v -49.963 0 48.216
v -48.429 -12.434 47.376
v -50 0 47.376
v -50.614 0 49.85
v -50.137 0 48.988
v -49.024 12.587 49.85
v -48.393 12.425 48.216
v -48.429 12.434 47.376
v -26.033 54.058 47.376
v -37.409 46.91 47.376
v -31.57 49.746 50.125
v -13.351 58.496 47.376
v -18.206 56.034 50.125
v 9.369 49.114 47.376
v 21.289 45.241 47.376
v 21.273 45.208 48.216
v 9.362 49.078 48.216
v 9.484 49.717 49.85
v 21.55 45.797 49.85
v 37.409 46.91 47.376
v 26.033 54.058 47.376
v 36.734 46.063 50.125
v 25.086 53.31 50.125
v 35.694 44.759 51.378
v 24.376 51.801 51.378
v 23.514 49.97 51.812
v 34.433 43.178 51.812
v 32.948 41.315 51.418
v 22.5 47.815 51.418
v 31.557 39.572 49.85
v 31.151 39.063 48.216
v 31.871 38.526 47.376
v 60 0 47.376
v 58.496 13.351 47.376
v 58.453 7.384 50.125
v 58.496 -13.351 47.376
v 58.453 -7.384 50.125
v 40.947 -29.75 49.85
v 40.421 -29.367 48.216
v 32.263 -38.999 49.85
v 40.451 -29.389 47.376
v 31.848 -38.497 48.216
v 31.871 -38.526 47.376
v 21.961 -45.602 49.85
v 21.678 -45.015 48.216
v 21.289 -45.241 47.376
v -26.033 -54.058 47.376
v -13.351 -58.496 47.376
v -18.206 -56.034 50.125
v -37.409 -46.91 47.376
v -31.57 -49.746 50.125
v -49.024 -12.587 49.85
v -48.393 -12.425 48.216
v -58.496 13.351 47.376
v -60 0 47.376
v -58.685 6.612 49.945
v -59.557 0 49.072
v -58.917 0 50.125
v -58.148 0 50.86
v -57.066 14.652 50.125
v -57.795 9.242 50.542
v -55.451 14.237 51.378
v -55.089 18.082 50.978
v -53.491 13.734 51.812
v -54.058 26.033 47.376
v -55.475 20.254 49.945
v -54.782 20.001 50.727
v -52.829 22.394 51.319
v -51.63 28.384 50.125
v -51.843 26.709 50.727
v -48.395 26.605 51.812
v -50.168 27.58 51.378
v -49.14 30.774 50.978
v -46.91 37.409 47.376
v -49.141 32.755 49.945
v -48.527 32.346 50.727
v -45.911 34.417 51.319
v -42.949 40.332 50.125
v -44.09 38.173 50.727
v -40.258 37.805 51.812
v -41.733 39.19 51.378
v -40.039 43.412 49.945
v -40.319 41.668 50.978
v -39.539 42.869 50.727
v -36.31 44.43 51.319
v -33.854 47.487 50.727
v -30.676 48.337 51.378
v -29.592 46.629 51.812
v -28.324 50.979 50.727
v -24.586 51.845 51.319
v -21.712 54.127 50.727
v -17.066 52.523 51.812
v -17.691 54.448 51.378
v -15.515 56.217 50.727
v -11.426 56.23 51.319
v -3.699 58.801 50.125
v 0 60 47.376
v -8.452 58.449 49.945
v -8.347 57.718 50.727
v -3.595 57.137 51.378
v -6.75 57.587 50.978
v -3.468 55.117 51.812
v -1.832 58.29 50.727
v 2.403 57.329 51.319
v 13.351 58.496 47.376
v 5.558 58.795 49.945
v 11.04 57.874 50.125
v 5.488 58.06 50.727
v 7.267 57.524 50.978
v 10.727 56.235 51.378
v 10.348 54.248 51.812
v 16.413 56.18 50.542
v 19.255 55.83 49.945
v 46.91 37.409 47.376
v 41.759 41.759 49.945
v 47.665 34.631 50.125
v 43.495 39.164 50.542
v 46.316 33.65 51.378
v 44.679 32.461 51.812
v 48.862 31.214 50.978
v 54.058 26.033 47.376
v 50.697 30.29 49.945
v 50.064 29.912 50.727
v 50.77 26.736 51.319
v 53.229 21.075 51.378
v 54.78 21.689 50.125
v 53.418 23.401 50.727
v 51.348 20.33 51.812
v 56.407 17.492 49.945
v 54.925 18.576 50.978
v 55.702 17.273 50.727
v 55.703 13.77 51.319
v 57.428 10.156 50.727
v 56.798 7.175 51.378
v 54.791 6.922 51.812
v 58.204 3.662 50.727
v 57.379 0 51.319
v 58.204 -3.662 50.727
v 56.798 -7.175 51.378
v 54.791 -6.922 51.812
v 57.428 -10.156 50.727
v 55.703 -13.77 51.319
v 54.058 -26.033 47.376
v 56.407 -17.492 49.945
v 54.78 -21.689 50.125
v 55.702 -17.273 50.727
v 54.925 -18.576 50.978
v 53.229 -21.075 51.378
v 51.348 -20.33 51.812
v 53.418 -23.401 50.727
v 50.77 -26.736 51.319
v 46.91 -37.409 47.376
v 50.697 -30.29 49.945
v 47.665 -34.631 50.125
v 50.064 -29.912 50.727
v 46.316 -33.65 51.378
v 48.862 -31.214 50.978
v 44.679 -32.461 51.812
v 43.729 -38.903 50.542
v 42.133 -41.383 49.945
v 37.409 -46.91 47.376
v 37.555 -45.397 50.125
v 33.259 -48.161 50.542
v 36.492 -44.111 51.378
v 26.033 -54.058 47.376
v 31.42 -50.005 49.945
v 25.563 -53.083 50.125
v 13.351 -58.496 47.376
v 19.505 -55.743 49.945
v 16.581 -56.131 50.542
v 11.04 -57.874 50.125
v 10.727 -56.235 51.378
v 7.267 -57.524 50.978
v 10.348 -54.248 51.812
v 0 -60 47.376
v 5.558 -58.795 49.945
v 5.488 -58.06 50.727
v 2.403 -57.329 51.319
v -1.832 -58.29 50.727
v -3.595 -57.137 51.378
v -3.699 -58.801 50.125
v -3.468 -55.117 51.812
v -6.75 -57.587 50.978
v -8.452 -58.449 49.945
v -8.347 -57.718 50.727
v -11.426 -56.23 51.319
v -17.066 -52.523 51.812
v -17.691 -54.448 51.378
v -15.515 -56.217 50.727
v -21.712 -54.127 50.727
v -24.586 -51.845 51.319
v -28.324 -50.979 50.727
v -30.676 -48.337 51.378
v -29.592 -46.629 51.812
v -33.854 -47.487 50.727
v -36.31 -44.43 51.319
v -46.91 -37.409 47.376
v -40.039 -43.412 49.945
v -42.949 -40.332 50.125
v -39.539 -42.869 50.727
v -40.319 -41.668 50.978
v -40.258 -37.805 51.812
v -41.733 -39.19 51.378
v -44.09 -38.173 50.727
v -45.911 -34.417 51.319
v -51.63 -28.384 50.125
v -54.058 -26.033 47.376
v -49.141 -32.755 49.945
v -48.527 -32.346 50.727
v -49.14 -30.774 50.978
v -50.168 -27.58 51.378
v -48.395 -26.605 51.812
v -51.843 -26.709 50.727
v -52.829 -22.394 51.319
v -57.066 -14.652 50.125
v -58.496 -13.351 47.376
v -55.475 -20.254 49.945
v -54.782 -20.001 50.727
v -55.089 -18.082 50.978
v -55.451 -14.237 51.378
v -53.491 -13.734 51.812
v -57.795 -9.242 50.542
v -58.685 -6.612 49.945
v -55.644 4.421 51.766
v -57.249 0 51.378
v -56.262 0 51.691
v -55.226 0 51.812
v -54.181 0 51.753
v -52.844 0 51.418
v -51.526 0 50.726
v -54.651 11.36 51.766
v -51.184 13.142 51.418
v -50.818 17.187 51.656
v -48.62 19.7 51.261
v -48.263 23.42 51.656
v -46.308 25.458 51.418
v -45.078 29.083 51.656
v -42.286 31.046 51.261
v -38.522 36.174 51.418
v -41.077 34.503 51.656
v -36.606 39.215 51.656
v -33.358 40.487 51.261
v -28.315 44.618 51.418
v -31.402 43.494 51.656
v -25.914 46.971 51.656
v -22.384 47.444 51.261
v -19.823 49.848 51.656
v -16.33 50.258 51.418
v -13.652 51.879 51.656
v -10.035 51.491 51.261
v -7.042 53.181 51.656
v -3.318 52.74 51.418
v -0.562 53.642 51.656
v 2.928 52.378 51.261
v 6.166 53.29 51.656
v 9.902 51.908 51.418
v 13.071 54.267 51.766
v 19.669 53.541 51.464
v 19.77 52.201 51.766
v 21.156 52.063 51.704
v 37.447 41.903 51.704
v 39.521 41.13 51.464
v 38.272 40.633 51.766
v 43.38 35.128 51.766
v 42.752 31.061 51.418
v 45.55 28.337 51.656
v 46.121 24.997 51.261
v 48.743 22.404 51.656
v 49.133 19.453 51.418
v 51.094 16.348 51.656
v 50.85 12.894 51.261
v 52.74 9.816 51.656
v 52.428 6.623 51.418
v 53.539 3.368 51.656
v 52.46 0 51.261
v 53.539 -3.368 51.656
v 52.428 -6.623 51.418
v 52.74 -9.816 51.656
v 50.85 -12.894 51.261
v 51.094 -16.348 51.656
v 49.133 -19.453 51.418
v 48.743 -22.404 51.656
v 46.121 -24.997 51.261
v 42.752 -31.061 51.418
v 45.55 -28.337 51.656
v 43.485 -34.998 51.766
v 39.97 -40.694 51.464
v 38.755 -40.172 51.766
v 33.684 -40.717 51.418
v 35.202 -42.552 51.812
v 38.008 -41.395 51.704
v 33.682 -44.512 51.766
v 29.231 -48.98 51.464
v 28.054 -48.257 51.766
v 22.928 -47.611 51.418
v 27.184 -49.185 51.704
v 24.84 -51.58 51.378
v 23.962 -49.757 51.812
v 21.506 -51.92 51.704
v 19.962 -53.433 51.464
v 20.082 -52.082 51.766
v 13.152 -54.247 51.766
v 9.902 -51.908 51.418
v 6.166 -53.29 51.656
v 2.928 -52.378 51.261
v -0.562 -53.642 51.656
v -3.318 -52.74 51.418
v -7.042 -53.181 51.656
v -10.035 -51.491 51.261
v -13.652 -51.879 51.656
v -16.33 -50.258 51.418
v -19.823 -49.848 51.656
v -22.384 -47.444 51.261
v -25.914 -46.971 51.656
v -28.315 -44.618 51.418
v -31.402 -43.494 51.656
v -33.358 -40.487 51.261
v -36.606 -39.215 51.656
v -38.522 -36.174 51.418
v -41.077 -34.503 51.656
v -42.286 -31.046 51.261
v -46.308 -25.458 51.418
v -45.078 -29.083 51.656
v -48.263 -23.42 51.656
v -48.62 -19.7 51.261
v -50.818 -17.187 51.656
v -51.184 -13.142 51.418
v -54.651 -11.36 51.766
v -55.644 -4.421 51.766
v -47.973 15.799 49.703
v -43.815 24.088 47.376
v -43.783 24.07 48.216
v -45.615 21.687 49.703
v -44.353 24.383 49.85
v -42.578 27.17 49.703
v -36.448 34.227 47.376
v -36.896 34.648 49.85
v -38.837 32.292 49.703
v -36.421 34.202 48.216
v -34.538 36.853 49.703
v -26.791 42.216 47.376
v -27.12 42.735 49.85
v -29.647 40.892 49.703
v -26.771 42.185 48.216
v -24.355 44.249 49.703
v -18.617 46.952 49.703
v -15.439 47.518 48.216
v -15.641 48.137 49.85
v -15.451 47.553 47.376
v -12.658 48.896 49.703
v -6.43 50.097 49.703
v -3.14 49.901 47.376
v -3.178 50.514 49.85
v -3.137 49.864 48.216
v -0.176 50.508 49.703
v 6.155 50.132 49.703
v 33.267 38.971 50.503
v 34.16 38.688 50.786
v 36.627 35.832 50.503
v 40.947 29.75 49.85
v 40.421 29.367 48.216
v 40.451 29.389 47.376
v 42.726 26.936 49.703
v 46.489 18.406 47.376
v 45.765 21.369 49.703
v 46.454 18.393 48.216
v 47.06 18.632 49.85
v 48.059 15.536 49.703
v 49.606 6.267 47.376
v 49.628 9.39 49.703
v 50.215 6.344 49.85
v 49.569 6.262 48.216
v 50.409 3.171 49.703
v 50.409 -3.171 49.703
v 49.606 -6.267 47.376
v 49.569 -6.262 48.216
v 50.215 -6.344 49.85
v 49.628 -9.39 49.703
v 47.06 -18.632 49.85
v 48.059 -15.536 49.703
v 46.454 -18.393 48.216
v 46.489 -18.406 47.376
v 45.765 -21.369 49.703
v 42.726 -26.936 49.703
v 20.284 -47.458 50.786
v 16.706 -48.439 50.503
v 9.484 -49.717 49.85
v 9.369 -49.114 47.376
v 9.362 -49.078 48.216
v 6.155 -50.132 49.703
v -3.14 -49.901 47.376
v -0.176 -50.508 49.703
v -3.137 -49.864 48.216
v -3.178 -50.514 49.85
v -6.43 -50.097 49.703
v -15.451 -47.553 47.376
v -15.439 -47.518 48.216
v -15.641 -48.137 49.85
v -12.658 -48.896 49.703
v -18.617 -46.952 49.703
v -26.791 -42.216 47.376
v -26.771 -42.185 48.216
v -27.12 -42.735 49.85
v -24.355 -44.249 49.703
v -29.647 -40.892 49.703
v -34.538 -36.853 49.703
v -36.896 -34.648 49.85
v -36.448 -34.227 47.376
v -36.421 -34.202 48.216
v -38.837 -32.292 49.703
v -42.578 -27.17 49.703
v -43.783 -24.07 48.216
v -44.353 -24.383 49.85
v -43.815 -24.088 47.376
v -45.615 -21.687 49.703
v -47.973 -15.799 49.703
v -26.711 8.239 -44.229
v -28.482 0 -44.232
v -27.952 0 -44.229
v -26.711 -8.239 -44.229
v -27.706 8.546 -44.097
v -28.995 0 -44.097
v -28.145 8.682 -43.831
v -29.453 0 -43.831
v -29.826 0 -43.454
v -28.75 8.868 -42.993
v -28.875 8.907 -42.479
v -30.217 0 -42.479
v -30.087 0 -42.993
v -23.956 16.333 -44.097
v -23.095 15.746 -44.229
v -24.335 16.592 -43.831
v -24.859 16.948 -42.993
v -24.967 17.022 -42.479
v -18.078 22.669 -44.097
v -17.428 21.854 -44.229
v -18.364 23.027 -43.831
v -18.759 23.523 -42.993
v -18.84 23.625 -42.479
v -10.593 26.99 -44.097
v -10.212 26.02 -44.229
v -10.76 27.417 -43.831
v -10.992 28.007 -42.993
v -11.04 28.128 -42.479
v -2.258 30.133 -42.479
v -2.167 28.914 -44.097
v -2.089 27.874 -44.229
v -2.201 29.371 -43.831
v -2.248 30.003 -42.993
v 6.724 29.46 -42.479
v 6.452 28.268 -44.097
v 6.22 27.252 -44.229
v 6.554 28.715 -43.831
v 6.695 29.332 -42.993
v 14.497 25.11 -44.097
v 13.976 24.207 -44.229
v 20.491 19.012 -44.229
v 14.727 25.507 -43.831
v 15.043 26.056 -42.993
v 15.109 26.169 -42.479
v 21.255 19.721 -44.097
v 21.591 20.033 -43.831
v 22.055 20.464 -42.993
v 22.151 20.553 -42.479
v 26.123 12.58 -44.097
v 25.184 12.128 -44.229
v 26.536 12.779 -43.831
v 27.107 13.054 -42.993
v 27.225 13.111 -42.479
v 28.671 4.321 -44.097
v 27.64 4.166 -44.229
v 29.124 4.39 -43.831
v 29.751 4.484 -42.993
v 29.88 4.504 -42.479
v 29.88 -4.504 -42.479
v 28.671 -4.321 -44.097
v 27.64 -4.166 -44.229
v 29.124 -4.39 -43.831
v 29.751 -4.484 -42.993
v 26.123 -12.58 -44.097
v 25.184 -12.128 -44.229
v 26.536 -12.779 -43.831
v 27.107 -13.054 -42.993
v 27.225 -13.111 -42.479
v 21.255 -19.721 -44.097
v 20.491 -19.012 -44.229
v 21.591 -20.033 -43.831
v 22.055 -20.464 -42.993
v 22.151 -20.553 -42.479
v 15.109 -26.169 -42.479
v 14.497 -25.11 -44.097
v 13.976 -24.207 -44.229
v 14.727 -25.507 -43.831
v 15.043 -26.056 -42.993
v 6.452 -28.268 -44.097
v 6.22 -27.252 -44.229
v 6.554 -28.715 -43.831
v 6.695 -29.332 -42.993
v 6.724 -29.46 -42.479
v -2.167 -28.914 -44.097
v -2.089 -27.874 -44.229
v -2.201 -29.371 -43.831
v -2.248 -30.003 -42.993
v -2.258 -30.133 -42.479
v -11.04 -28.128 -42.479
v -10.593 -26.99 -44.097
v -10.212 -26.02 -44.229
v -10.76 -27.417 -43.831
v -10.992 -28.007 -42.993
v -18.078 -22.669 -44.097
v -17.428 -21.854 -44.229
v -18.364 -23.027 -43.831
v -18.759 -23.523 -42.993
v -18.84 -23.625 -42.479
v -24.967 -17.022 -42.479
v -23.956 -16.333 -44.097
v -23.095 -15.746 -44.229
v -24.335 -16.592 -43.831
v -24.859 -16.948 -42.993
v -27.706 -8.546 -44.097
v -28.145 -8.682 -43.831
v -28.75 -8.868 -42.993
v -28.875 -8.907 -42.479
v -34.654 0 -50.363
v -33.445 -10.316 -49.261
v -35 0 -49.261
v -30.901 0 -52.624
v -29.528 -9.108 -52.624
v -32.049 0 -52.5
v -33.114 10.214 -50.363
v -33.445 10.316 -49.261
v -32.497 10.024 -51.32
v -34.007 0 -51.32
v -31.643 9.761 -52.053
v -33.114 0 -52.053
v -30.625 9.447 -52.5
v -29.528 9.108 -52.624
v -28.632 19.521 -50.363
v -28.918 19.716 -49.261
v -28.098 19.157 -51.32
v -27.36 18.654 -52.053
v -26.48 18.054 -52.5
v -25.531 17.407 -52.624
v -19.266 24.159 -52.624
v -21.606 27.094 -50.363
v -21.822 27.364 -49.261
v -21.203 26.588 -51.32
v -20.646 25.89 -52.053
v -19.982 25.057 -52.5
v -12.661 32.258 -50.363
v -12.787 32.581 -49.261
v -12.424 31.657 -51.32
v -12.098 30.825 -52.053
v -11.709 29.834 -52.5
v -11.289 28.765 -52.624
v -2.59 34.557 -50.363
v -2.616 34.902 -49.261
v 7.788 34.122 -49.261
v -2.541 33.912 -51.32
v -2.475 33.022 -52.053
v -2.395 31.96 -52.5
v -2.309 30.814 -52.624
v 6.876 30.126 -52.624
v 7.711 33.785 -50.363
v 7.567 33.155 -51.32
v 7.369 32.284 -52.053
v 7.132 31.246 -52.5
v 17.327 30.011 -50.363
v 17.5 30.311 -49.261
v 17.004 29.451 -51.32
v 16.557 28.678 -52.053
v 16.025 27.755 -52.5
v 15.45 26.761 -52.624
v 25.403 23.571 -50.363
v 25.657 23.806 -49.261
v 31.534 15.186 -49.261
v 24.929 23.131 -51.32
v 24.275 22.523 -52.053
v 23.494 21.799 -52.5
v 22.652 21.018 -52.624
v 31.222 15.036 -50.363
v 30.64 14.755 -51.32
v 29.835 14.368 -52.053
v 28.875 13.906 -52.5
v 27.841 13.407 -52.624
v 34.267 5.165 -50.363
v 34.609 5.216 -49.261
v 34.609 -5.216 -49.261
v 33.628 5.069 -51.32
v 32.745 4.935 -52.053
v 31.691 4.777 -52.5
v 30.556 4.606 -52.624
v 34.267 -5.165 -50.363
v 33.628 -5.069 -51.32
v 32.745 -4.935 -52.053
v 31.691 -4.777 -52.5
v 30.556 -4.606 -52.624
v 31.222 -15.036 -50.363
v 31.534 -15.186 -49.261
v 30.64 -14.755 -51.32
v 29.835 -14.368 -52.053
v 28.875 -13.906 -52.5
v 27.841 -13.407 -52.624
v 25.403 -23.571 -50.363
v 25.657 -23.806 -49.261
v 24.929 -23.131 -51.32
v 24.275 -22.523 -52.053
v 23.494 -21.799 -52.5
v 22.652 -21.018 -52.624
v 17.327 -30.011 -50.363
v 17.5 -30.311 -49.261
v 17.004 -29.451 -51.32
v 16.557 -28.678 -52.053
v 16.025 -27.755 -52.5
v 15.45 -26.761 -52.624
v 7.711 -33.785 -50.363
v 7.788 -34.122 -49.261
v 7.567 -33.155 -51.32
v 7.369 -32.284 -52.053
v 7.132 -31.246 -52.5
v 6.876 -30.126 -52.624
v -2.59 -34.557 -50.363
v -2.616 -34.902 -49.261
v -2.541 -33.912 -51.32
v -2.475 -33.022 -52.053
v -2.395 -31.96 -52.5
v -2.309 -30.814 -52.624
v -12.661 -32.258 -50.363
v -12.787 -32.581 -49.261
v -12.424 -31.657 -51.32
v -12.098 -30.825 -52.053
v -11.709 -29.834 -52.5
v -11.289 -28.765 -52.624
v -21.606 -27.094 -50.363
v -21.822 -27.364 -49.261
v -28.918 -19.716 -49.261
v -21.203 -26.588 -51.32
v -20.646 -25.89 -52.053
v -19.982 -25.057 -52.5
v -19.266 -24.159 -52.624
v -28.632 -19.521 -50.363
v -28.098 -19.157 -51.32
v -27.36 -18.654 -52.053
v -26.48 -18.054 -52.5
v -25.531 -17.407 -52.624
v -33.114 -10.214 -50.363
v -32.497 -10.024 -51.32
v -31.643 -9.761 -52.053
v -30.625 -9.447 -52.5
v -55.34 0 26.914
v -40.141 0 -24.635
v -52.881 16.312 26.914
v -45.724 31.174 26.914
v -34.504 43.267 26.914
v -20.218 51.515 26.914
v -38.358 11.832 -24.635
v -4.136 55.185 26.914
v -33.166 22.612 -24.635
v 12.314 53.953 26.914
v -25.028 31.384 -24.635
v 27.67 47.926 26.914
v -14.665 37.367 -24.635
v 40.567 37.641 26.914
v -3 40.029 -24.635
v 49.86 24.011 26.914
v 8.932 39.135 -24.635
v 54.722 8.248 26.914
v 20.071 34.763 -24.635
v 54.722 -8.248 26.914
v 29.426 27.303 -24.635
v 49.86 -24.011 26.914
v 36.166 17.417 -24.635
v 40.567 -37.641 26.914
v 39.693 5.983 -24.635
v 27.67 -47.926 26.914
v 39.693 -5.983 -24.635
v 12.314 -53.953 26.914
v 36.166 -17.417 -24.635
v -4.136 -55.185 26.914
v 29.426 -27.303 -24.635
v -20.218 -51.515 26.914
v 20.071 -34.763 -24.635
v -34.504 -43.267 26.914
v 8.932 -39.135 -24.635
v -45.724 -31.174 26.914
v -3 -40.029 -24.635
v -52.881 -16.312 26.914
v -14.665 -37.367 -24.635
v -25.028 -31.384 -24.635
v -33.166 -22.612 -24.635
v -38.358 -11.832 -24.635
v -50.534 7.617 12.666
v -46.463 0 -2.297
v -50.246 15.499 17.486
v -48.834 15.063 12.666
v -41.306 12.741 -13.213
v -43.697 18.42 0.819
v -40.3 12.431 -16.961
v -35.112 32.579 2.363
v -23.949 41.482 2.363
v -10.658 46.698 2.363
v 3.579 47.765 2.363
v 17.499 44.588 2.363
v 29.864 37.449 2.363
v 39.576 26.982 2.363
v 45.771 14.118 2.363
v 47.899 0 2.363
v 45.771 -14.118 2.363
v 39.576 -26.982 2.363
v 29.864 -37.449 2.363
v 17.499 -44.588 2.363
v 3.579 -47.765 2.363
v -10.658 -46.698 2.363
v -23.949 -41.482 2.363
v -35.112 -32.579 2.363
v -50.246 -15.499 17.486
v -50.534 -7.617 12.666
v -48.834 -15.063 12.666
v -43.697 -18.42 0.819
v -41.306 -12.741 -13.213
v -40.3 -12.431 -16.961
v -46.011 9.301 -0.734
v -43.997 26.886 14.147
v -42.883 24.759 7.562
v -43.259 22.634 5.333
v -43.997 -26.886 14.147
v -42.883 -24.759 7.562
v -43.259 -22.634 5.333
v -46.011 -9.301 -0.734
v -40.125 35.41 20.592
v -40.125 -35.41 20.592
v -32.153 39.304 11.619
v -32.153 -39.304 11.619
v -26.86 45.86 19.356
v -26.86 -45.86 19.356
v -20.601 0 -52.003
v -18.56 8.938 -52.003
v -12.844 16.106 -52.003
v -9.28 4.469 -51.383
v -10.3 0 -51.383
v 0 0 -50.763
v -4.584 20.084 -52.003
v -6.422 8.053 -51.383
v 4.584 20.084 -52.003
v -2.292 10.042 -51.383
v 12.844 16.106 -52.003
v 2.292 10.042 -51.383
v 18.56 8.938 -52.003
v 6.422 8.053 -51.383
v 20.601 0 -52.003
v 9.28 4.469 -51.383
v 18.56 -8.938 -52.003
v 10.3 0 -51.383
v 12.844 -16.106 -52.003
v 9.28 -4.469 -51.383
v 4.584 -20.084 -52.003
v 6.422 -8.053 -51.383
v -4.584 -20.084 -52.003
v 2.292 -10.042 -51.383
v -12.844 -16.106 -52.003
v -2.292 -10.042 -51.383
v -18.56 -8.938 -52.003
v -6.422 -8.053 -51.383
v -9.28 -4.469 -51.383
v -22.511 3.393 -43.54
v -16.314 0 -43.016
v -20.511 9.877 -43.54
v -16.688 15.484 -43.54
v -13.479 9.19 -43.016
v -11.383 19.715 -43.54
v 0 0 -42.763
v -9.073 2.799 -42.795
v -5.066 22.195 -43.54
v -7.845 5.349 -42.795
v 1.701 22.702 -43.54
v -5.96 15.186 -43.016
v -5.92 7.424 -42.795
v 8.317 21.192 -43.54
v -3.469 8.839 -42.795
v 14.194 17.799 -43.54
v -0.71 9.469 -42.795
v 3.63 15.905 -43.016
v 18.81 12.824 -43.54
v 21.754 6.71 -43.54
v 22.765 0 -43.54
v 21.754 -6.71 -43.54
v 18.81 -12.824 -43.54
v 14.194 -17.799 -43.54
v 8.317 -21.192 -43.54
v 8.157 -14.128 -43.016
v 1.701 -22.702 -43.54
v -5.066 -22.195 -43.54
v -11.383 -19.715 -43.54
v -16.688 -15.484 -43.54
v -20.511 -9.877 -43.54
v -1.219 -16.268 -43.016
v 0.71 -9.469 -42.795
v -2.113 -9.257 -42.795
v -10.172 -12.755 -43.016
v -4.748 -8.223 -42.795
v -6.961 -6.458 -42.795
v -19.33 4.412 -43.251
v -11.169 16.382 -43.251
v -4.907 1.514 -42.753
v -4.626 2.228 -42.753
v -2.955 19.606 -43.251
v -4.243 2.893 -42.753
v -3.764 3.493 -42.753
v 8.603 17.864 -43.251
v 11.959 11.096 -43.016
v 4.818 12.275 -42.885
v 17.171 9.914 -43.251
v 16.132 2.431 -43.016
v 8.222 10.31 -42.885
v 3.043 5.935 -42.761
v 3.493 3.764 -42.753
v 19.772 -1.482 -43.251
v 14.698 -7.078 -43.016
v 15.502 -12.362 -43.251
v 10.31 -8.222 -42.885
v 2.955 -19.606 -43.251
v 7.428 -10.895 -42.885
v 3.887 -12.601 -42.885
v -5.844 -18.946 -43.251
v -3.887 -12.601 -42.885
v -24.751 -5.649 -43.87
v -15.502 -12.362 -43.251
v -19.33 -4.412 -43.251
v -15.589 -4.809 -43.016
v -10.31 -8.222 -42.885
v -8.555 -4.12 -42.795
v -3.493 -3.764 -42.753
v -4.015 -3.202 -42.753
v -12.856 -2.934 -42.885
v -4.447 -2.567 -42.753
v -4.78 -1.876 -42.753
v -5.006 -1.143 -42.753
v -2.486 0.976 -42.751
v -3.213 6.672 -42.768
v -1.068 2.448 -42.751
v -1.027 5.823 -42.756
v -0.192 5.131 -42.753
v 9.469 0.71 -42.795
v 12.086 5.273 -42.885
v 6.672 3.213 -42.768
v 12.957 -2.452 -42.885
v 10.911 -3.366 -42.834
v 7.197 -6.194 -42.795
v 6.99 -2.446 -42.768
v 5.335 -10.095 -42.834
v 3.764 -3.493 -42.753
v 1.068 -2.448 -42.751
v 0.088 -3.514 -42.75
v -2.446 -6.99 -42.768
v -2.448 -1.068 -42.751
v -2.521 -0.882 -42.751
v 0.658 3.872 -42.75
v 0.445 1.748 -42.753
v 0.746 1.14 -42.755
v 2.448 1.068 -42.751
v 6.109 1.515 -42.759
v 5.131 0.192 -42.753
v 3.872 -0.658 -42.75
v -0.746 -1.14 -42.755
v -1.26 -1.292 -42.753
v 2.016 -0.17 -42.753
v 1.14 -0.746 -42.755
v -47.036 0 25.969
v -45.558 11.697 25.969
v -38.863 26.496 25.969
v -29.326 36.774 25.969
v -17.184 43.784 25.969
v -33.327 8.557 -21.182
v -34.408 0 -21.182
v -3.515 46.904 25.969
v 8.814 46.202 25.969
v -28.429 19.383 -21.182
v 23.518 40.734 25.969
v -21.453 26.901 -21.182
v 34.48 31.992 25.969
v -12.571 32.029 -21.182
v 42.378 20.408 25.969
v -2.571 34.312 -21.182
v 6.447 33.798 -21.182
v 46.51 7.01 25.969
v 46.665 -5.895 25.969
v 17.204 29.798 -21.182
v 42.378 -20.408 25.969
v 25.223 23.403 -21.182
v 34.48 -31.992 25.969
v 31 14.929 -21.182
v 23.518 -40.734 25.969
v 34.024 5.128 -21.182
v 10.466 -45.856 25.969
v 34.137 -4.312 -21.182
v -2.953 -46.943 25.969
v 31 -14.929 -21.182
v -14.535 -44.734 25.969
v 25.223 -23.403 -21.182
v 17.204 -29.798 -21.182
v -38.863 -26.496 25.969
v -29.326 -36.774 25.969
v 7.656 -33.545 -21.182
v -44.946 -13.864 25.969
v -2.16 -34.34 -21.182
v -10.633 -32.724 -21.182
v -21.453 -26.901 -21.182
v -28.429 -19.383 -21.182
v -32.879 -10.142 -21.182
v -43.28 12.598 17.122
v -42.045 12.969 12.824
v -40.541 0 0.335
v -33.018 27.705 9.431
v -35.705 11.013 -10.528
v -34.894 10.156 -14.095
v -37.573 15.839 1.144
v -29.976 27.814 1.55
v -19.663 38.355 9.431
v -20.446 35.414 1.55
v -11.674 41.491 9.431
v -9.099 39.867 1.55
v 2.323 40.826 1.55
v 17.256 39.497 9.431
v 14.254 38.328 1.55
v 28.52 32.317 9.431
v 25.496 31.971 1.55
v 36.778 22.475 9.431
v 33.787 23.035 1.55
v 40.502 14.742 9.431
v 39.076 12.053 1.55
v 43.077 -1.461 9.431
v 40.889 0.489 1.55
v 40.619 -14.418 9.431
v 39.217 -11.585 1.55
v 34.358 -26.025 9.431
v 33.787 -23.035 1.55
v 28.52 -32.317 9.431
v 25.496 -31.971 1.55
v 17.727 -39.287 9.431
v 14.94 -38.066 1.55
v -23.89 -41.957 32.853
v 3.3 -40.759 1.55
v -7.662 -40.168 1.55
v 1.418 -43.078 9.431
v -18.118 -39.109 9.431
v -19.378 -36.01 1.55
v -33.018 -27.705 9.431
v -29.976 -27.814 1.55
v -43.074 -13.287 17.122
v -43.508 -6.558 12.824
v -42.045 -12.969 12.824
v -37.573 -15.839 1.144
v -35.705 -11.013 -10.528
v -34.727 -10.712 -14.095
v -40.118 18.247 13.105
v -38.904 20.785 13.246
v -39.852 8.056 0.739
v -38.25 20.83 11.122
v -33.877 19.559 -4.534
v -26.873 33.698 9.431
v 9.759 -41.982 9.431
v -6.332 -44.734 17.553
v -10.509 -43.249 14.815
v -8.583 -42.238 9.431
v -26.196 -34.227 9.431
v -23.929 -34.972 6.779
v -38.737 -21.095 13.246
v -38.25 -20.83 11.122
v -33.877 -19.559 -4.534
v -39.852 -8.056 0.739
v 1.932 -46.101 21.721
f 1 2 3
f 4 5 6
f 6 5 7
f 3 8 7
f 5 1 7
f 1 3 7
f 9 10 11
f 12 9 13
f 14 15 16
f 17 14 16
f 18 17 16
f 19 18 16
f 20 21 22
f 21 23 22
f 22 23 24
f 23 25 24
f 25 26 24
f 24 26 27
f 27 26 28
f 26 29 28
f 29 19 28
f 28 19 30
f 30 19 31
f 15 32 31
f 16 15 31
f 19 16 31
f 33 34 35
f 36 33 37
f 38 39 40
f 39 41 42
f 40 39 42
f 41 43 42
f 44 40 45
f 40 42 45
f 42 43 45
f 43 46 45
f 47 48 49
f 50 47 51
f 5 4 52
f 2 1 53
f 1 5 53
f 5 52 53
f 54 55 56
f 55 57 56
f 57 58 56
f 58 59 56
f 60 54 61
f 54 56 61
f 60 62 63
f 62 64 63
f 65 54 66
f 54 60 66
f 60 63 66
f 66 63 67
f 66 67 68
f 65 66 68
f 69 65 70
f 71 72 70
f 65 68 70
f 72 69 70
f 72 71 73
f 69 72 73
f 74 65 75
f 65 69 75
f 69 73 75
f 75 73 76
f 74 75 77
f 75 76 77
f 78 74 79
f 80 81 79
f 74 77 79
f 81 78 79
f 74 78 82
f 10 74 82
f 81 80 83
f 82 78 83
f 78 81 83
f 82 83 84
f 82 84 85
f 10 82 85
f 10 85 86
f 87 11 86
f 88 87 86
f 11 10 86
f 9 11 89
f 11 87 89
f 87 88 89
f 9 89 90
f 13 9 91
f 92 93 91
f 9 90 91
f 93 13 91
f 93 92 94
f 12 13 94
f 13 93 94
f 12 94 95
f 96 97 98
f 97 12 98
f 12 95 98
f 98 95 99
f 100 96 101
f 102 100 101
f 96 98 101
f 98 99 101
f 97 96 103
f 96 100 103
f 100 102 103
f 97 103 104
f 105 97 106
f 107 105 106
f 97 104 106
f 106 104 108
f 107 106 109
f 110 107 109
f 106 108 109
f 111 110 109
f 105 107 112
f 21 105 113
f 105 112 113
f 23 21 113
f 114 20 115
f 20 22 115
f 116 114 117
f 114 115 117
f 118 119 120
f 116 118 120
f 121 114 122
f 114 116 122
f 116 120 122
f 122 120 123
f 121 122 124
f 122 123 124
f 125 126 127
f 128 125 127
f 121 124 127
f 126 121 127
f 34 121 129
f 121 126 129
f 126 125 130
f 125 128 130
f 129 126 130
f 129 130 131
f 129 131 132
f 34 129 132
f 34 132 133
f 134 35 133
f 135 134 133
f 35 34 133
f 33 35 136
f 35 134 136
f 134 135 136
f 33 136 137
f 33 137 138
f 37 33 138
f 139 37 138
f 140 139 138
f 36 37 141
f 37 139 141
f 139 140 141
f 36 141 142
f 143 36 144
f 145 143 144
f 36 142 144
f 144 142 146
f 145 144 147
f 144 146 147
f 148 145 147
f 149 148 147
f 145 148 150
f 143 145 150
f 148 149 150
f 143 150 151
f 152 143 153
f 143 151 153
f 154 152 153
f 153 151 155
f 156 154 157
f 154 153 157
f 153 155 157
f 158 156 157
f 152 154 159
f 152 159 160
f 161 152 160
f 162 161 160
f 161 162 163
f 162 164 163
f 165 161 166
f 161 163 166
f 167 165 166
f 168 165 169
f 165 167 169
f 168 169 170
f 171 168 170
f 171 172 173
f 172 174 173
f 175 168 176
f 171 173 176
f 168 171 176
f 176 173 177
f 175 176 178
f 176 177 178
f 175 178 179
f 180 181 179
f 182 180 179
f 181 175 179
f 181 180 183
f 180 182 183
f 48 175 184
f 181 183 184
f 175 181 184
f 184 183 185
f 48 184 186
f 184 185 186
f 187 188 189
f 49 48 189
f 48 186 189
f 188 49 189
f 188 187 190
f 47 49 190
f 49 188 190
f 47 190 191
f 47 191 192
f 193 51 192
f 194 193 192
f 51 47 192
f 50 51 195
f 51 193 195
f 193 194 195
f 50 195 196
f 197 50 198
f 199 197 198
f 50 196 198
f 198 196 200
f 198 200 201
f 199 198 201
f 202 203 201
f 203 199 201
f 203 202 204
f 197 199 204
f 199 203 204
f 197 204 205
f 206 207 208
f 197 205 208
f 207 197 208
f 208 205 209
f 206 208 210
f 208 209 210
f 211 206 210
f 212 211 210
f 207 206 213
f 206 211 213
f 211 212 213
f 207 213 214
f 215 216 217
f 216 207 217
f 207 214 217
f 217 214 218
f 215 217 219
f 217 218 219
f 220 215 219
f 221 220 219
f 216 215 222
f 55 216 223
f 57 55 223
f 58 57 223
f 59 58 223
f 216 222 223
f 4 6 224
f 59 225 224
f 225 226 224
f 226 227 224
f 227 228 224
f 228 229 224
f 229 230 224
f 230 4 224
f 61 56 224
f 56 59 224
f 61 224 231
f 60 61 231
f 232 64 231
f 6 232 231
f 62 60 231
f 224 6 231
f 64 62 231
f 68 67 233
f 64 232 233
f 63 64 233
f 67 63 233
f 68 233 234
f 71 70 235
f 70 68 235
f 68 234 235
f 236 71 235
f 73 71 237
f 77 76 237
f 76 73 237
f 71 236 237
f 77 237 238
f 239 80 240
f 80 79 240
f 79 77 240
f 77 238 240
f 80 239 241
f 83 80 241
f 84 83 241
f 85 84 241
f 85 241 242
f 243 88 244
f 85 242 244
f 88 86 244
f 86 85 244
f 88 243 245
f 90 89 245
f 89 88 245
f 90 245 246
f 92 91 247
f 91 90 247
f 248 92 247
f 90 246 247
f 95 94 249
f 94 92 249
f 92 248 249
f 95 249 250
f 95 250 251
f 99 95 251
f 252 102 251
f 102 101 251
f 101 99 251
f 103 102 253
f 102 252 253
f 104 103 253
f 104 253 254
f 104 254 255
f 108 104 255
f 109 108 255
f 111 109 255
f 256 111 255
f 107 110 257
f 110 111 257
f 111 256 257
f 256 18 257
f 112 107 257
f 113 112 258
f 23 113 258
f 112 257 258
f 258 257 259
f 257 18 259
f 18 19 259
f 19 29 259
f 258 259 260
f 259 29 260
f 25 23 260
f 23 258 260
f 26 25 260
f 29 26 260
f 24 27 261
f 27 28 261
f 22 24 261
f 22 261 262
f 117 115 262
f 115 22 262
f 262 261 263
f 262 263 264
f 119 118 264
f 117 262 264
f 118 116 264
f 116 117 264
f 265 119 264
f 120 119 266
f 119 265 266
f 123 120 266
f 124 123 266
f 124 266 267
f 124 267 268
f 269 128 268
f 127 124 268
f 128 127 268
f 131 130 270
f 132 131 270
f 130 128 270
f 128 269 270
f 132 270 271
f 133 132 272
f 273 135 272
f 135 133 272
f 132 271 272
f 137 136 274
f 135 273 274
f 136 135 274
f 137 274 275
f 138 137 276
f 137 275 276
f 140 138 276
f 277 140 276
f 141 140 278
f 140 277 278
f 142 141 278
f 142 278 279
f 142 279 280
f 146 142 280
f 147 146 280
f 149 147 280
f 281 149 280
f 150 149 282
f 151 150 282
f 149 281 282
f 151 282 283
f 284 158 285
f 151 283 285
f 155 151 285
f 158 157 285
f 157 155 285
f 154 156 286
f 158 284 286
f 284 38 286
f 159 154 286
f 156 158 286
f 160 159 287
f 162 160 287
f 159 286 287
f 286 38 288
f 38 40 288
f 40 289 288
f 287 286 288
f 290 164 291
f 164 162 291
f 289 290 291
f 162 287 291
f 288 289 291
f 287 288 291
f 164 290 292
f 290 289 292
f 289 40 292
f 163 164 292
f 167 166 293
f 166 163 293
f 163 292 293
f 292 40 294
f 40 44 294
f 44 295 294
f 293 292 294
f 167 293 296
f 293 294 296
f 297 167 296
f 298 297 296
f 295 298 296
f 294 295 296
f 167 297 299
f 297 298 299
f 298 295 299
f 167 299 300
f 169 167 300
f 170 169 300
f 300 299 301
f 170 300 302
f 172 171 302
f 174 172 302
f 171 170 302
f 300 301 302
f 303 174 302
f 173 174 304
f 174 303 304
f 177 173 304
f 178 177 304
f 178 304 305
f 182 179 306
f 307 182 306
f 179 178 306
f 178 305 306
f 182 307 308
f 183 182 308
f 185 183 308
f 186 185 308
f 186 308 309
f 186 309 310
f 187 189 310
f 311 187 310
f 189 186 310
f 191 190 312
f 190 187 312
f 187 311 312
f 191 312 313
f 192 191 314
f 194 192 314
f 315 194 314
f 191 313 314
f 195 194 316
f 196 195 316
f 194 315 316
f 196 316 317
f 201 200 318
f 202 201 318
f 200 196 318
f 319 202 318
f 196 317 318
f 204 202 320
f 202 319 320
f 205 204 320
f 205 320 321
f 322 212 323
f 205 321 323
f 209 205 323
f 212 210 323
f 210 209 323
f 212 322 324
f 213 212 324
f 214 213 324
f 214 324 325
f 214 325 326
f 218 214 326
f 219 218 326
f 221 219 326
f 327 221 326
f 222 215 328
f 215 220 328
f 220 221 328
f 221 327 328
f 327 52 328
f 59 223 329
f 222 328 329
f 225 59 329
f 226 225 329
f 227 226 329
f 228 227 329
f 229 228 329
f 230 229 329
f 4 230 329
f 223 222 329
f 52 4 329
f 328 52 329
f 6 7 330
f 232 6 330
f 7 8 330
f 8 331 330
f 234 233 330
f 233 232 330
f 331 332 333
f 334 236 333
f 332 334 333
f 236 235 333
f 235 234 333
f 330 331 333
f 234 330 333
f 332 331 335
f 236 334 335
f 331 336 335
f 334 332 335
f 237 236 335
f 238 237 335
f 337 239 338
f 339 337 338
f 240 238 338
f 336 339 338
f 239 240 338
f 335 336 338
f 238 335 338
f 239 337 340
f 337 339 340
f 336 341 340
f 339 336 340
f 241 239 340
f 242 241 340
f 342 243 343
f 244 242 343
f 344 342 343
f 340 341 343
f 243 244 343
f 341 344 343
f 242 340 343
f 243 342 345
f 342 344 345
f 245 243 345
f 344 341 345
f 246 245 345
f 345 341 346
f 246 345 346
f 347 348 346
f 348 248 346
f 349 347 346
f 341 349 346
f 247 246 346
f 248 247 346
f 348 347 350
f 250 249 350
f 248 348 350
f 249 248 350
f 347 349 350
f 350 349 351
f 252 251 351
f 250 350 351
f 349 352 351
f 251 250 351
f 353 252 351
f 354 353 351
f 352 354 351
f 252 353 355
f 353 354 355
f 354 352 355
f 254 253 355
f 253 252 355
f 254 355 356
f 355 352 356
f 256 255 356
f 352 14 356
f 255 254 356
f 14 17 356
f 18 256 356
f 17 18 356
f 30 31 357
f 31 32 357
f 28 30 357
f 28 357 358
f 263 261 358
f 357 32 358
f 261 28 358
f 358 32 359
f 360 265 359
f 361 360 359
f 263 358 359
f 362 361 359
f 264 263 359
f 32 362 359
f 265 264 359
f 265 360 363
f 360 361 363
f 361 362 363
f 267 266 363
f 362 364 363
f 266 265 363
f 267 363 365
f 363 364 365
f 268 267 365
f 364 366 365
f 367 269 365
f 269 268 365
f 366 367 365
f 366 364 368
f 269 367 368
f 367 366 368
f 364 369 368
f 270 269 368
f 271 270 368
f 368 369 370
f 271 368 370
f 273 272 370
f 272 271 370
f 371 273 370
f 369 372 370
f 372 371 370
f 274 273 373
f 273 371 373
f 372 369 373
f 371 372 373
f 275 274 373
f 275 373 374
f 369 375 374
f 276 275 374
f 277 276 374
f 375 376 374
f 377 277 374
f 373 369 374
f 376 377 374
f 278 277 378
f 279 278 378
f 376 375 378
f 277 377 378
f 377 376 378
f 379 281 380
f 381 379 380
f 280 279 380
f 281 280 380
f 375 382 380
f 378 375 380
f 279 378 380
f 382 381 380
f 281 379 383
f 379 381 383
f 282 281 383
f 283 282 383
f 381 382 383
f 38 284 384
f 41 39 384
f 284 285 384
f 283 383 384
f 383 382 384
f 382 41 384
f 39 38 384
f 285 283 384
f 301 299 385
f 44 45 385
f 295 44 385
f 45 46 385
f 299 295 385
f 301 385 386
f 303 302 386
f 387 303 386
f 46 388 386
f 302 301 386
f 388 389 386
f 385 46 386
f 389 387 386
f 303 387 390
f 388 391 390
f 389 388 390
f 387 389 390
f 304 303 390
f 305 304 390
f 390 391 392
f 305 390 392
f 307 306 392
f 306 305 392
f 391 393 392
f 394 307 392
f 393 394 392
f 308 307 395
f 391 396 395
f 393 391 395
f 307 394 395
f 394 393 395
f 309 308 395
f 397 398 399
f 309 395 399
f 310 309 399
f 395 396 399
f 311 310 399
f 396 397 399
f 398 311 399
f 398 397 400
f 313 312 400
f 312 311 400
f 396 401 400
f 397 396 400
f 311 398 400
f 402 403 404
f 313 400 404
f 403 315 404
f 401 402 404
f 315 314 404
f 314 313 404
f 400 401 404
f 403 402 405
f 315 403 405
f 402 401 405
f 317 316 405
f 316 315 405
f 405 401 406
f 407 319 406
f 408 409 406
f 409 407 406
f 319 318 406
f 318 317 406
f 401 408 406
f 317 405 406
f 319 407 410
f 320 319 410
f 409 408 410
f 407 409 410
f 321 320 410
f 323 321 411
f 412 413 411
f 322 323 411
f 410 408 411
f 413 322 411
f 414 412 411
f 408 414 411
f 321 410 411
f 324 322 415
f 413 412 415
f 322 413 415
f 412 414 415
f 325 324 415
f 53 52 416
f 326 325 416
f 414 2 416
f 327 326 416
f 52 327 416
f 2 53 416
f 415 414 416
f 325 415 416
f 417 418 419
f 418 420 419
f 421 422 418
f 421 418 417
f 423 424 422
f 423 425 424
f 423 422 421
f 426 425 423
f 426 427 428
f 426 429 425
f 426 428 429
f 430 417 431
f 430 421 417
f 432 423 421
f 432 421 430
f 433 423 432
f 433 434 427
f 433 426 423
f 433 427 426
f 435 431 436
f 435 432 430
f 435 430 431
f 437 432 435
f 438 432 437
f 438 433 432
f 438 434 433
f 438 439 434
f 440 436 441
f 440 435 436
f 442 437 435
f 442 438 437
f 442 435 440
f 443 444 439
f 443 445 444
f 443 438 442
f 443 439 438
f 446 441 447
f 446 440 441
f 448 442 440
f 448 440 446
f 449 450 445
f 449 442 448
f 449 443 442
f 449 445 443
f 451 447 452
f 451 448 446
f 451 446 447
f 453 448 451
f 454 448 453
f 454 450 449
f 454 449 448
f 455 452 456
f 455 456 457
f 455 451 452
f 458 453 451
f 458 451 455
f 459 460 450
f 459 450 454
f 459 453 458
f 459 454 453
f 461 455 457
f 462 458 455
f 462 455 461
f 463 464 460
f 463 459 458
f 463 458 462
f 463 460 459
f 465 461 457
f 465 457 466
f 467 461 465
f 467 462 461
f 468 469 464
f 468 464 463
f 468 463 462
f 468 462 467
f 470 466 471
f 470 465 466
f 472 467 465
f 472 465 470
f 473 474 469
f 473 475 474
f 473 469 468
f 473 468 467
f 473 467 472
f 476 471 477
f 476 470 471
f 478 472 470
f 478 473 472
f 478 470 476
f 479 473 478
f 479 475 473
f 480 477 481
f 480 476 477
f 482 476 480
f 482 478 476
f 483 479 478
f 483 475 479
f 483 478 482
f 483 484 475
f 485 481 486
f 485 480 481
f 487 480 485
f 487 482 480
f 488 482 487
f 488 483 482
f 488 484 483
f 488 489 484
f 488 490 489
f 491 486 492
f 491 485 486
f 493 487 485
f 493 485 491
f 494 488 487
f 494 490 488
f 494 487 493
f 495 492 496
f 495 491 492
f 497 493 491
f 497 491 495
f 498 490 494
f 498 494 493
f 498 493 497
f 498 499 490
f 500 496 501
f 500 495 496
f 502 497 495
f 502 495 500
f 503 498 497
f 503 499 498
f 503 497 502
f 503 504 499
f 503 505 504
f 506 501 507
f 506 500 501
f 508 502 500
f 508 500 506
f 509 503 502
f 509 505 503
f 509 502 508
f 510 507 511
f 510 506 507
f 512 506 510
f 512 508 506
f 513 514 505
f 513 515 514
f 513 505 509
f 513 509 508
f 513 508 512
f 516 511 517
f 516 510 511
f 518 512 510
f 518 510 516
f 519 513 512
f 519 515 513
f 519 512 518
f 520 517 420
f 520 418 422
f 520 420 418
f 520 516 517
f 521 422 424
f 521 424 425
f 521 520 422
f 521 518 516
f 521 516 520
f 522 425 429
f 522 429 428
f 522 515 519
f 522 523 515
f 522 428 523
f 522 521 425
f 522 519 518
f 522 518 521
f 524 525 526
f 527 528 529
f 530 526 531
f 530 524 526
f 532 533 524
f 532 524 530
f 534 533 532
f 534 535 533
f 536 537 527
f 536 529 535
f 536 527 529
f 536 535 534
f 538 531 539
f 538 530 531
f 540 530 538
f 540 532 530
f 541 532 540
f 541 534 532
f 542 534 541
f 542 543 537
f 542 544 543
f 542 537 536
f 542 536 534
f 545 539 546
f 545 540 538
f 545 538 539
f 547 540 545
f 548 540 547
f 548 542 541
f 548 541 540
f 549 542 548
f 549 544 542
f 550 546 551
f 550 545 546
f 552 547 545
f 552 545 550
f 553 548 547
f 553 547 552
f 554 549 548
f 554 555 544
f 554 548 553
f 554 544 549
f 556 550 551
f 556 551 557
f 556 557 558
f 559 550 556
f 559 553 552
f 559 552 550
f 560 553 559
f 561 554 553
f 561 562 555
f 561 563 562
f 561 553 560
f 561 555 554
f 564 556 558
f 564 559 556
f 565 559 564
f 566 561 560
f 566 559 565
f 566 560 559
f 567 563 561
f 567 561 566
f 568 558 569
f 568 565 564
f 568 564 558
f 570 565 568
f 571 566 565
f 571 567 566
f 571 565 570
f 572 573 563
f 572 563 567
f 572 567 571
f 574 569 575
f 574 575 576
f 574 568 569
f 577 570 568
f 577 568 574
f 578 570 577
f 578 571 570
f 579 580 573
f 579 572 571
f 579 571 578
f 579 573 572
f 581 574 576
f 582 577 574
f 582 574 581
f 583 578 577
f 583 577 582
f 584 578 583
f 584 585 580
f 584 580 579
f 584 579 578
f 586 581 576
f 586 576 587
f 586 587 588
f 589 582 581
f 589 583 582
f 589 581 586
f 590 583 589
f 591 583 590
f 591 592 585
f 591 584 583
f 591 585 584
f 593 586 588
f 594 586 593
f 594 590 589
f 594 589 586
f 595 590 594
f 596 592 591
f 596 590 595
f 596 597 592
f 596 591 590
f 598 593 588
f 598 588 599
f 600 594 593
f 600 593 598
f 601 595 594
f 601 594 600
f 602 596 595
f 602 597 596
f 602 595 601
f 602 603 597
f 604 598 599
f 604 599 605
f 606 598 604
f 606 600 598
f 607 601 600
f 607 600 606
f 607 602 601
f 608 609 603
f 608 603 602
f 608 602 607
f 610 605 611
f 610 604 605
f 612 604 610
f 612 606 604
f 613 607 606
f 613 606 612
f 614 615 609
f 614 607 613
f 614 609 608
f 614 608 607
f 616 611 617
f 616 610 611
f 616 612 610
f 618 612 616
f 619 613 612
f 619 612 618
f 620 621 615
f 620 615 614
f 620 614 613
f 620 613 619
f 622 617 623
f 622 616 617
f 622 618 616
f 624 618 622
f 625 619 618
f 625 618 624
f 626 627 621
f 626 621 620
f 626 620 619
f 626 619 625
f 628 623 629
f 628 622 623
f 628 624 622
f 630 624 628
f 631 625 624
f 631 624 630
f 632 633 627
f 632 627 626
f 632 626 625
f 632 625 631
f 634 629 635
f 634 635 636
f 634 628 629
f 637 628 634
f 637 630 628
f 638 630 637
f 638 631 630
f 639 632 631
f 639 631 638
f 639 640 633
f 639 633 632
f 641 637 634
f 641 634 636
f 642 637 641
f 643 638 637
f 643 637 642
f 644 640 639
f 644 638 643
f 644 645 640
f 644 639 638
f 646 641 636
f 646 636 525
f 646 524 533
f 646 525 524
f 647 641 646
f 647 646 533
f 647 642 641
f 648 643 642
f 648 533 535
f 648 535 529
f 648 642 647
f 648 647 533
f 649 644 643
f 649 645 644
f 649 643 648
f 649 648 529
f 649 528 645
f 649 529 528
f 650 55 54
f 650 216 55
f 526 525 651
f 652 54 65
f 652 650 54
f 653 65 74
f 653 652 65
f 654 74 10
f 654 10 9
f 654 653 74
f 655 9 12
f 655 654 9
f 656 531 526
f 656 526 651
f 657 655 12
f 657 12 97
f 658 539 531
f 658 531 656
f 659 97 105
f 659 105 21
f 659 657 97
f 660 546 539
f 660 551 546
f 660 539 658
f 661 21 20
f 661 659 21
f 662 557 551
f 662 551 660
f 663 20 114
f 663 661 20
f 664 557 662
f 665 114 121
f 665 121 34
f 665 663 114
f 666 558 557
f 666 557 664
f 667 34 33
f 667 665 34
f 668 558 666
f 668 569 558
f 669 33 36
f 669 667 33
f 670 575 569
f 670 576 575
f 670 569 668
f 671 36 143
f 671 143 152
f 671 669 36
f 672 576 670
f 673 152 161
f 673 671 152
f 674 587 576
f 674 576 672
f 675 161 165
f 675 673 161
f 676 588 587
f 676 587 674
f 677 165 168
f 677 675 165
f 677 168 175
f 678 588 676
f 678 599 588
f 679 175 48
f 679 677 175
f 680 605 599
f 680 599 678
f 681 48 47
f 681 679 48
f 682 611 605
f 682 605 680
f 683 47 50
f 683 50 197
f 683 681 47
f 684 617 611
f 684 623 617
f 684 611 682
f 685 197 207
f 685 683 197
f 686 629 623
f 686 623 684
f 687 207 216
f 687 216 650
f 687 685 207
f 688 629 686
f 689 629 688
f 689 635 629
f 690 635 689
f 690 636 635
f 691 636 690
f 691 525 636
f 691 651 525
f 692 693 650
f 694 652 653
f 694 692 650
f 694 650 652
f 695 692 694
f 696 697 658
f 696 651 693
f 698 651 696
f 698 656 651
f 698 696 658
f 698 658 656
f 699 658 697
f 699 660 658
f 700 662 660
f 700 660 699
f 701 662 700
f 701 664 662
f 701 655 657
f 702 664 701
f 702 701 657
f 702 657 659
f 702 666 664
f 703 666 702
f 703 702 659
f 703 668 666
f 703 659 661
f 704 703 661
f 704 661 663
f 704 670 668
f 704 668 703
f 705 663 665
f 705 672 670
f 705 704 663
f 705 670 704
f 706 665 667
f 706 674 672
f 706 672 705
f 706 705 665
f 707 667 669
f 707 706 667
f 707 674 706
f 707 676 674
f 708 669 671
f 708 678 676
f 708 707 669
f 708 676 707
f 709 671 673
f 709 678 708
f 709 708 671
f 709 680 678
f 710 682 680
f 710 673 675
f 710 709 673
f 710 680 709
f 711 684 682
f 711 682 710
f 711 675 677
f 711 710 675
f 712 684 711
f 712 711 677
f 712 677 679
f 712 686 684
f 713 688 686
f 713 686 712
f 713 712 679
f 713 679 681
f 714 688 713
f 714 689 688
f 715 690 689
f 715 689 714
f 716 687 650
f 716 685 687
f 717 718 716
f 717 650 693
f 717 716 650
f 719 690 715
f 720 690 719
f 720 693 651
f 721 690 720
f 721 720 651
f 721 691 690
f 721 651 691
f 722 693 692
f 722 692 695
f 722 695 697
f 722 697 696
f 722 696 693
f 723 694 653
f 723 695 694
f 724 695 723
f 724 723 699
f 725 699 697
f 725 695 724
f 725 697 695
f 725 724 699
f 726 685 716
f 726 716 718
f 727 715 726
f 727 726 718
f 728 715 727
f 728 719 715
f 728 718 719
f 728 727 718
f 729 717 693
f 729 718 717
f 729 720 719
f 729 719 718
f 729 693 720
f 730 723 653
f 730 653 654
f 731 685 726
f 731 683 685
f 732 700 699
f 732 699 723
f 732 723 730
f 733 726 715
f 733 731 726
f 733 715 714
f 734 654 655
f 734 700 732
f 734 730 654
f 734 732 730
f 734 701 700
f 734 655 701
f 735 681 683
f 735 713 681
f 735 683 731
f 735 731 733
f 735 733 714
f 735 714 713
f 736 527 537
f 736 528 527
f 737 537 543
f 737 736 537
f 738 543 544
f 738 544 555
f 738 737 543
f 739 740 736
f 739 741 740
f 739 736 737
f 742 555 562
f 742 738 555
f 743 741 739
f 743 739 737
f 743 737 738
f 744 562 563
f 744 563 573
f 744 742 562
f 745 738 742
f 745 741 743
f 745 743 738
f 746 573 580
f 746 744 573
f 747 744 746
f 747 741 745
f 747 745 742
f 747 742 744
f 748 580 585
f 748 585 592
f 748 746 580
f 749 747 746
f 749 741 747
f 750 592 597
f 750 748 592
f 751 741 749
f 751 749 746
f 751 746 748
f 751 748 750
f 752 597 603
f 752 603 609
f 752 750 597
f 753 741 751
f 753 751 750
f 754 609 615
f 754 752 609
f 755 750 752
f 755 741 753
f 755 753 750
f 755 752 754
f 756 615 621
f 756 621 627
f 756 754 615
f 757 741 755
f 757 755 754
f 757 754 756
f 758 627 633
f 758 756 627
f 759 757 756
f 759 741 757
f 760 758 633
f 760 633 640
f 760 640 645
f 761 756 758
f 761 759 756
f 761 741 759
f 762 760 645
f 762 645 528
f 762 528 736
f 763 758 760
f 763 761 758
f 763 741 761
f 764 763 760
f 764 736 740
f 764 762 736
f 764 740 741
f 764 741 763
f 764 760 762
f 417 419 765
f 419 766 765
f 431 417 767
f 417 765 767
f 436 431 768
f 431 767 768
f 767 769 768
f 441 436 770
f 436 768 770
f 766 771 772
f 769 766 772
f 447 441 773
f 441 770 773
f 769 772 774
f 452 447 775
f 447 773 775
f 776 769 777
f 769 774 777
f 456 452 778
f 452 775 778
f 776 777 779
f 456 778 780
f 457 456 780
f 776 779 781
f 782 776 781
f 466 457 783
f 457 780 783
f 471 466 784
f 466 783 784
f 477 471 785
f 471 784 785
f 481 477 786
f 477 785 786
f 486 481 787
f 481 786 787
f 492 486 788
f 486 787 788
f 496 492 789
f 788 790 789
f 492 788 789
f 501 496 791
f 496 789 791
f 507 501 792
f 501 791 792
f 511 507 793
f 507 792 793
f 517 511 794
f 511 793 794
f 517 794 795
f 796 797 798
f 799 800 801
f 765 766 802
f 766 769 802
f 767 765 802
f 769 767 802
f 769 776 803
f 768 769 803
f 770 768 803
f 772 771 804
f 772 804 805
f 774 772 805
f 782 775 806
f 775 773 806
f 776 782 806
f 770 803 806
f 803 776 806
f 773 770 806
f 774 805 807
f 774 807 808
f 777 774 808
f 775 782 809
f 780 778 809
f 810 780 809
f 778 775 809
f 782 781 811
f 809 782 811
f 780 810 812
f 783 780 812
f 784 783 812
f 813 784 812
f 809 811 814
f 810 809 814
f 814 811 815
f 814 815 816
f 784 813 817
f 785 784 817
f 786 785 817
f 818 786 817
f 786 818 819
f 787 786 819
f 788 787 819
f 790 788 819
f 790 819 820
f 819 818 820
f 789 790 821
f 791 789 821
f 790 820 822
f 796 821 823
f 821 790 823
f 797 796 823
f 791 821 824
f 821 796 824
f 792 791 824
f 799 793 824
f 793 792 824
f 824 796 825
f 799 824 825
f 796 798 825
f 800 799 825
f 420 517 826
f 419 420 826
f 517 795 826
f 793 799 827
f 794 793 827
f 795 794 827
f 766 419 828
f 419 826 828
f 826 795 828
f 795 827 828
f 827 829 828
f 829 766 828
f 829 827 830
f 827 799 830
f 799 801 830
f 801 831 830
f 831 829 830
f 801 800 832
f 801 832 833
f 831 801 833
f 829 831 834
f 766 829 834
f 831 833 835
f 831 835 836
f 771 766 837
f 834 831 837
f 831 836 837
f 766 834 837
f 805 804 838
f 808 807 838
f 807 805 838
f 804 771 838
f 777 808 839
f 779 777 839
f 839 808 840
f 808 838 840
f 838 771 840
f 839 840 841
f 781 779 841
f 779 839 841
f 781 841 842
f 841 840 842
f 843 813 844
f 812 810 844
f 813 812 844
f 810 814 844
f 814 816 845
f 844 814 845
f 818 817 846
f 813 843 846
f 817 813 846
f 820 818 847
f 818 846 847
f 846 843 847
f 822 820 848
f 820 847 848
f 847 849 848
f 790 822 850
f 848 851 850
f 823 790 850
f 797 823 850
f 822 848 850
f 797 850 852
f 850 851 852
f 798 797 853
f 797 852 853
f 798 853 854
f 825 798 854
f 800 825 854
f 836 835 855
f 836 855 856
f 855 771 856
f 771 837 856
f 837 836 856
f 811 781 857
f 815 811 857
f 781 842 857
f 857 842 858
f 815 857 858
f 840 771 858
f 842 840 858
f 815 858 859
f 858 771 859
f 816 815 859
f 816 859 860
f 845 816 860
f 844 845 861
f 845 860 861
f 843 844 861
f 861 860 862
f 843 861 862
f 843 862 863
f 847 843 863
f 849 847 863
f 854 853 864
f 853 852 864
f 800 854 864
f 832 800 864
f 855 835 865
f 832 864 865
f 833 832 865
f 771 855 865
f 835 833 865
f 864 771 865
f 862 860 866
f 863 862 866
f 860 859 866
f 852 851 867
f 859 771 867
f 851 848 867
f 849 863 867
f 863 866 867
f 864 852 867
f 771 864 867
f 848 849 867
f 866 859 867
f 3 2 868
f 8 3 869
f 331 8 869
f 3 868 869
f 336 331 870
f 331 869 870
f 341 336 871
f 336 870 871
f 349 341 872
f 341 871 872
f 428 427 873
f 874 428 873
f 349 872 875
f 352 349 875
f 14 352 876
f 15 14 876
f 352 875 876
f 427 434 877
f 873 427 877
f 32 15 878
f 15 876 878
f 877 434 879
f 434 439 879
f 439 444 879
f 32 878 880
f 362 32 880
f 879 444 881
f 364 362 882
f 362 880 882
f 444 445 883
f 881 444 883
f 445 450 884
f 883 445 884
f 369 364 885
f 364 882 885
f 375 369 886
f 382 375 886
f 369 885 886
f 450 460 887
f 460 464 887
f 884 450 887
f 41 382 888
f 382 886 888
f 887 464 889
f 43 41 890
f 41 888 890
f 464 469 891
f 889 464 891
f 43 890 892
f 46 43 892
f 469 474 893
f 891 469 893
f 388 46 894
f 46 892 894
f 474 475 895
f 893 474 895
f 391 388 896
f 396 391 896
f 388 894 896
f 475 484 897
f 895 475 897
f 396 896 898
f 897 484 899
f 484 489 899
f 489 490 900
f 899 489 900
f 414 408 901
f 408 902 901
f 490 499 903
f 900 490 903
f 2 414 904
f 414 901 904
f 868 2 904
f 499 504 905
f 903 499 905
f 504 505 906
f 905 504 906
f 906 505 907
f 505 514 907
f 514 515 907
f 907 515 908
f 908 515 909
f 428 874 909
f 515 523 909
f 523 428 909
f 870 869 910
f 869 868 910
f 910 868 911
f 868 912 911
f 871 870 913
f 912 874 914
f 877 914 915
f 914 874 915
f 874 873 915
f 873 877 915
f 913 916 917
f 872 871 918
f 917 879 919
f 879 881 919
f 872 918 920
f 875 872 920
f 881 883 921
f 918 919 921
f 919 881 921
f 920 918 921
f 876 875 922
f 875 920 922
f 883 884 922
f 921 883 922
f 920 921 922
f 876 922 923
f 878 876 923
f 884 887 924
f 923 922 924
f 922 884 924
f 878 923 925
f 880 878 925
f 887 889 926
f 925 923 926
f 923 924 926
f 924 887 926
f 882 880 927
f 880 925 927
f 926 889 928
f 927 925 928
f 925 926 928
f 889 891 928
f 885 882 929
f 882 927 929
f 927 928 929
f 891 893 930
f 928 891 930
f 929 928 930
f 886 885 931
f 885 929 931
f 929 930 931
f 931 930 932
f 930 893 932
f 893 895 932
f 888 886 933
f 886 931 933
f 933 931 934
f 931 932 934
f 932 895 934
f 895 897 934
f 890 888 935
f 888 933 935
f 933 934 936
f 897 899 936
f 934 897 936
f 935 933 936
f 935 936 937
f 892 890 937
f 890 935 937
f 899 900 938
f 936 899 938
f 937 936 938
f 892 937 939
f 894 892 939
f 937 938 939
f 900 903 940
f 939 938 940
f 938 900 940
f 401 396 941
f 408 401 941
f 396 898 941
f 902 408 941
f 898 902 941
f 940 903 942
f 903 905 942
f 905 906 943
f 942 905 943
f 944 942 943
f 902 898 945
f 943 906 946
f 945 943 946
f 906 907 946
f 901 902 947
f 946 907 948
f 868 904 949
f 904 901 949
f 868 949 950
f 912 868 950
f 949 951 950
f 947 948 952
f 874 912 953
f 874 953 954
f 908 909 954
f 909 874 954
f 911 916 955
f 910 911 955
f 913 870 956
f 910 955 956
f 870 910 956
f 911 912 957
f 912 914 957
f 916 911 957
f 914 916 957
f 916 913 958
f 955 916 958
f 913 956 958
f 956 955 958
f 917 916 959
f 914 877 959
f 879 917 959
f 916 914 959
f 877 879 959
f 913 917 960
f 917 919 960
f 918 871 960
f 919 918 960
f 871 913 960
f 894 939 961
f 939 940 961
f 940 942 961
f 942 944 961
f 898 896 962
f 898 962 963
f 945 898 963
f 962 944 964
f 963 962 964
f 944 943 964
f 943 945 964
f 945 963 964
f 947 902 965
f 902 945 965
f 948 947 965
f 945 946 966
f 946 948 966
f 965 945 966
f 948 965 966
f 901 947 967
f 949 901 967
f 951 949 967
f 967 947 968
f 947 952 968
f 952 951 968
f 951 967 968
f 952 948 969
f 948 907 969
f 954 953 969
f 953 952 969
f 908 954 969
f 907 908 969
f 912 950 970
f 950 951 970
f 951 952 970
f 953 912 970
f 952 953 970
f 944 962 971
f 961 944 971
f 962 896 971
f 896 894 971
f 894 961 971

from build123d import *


with BuildPart() as f1:
    # F0 (on Front) → F1 (revolve)
    with BuildSketch(Plane.XZ):
        with BuildLine():
            add(Edge.make_bspline(
                [(-60, 47.3764357992), (-59.1981715925, 54.3134284554), (-49.1629564653, 52.1779667281), (-50, 47.3764357992)],
                knots=[0, 0, 0, 0, 10, 10, 10, 10], degree=3))
            add(Edge.make_bspline(
                [(-60, 47.3764357992), (-55.4738223712, 19.3348543775), (-41.2842135029, -10.1671062354), (-35, -49.2612064975)],
                knots=[0, 0, 0, 0, 100.372548327, 100.372548327, 100.372548327, 100.372548327], degree=3))
            ThreePointArc((-35, -49.2612064975), (-33.5874853172, -51.7190592626), (-30.900831495, -52.6235642008))
            Line((-30.900831495, -52.6235642008), (0, -50.7629300788))
            Line((0, -50.7629300788), (0, -42.7629300788))
            add(Edge.make_bspline(
                [(-27.9523732894, -44.2288875024), (-21.8632061772, -43.3738194628), (-17.4085828413, -42.6430236165), (0, -42.7629300788)],
                knots=[2.9281053207, 2.9281053207, 2.9281053207, 2.9281053207, 30.0507843803, 30.0507843803, 30.0507843803, 30.0507843803], degree=3))
            add(Edge.make_bspline(
                [(-30, -44.5092524641), (-29.2861701407, -44.4149584453), (-28.6097465002, -44.3211987844), (-27.9523732894, -44.2288875024)],
                knots=[0, 0, 0, 0, 2.9281053207, 2.9281053207, 2.9281053207, 2.9281053207], degree=3))
            add(Edge.make_bspline(
                [(-30.2171291126, -42.4791417374), (-30.1386829619, -43.1543106337), (-30.0662089029, -43.8309579045), (-30, -44.5092524641)],
                knots=[91.8520706201, 91.8520706201, 91.8520706201, 91.8520706201, 94.0371187756, 94.0371187756, 94.0371187756, 94.0371187756], degree=3))
            add(Edge.make_bspline(
                [(-50, 47.3764357992), (-47.3655089991, 11.672110508), (-33.514741275, -14.0973136357), (-30.2171291126, -42.4791417374)],
                knots=[0, 0, 0, 0, 91.8520706201, 91.8520706201, 91.8520706201, 91.8520706201], degree=3))
        make_face()
        with BuildLine():
            ThreePointArc((-27.9523732894, -44.2288875024), (-29.4532603476, -43.8309886194), (-30.2171291126, -42.4791417374))
            add(Edge.make_bspline(
                [(-30.2171291126, -42.4791417374), (-30.1386829619, -43.1543106337), (-30.0662089029, -43.8309579045), (-30, -44.5092524641)],
                knots=[91.8520706201, 91.8520706201, 91.8520706201, 91.8520706201, 94.0371187756, 94.0371187756, 94.0371187756, 94.0371187756], degree=3))
            add(Edge.make_bspline(
                [(-30, -44.5092524641), (-29.2861701407, -44.4149584453), (-28.6097465002, -44.3211987844), (-27.9523732894, -44.2288875024)],
                knots=[0, 0, 0, 0, 2.9281053207, 2.9281053207, 2.9281053207, 2.9281053207], degree=3))
        make_face()
    revolve(axis=Axis((0, 0, -1.7270445824), (0, 0, -1)))


solid = f1.part
